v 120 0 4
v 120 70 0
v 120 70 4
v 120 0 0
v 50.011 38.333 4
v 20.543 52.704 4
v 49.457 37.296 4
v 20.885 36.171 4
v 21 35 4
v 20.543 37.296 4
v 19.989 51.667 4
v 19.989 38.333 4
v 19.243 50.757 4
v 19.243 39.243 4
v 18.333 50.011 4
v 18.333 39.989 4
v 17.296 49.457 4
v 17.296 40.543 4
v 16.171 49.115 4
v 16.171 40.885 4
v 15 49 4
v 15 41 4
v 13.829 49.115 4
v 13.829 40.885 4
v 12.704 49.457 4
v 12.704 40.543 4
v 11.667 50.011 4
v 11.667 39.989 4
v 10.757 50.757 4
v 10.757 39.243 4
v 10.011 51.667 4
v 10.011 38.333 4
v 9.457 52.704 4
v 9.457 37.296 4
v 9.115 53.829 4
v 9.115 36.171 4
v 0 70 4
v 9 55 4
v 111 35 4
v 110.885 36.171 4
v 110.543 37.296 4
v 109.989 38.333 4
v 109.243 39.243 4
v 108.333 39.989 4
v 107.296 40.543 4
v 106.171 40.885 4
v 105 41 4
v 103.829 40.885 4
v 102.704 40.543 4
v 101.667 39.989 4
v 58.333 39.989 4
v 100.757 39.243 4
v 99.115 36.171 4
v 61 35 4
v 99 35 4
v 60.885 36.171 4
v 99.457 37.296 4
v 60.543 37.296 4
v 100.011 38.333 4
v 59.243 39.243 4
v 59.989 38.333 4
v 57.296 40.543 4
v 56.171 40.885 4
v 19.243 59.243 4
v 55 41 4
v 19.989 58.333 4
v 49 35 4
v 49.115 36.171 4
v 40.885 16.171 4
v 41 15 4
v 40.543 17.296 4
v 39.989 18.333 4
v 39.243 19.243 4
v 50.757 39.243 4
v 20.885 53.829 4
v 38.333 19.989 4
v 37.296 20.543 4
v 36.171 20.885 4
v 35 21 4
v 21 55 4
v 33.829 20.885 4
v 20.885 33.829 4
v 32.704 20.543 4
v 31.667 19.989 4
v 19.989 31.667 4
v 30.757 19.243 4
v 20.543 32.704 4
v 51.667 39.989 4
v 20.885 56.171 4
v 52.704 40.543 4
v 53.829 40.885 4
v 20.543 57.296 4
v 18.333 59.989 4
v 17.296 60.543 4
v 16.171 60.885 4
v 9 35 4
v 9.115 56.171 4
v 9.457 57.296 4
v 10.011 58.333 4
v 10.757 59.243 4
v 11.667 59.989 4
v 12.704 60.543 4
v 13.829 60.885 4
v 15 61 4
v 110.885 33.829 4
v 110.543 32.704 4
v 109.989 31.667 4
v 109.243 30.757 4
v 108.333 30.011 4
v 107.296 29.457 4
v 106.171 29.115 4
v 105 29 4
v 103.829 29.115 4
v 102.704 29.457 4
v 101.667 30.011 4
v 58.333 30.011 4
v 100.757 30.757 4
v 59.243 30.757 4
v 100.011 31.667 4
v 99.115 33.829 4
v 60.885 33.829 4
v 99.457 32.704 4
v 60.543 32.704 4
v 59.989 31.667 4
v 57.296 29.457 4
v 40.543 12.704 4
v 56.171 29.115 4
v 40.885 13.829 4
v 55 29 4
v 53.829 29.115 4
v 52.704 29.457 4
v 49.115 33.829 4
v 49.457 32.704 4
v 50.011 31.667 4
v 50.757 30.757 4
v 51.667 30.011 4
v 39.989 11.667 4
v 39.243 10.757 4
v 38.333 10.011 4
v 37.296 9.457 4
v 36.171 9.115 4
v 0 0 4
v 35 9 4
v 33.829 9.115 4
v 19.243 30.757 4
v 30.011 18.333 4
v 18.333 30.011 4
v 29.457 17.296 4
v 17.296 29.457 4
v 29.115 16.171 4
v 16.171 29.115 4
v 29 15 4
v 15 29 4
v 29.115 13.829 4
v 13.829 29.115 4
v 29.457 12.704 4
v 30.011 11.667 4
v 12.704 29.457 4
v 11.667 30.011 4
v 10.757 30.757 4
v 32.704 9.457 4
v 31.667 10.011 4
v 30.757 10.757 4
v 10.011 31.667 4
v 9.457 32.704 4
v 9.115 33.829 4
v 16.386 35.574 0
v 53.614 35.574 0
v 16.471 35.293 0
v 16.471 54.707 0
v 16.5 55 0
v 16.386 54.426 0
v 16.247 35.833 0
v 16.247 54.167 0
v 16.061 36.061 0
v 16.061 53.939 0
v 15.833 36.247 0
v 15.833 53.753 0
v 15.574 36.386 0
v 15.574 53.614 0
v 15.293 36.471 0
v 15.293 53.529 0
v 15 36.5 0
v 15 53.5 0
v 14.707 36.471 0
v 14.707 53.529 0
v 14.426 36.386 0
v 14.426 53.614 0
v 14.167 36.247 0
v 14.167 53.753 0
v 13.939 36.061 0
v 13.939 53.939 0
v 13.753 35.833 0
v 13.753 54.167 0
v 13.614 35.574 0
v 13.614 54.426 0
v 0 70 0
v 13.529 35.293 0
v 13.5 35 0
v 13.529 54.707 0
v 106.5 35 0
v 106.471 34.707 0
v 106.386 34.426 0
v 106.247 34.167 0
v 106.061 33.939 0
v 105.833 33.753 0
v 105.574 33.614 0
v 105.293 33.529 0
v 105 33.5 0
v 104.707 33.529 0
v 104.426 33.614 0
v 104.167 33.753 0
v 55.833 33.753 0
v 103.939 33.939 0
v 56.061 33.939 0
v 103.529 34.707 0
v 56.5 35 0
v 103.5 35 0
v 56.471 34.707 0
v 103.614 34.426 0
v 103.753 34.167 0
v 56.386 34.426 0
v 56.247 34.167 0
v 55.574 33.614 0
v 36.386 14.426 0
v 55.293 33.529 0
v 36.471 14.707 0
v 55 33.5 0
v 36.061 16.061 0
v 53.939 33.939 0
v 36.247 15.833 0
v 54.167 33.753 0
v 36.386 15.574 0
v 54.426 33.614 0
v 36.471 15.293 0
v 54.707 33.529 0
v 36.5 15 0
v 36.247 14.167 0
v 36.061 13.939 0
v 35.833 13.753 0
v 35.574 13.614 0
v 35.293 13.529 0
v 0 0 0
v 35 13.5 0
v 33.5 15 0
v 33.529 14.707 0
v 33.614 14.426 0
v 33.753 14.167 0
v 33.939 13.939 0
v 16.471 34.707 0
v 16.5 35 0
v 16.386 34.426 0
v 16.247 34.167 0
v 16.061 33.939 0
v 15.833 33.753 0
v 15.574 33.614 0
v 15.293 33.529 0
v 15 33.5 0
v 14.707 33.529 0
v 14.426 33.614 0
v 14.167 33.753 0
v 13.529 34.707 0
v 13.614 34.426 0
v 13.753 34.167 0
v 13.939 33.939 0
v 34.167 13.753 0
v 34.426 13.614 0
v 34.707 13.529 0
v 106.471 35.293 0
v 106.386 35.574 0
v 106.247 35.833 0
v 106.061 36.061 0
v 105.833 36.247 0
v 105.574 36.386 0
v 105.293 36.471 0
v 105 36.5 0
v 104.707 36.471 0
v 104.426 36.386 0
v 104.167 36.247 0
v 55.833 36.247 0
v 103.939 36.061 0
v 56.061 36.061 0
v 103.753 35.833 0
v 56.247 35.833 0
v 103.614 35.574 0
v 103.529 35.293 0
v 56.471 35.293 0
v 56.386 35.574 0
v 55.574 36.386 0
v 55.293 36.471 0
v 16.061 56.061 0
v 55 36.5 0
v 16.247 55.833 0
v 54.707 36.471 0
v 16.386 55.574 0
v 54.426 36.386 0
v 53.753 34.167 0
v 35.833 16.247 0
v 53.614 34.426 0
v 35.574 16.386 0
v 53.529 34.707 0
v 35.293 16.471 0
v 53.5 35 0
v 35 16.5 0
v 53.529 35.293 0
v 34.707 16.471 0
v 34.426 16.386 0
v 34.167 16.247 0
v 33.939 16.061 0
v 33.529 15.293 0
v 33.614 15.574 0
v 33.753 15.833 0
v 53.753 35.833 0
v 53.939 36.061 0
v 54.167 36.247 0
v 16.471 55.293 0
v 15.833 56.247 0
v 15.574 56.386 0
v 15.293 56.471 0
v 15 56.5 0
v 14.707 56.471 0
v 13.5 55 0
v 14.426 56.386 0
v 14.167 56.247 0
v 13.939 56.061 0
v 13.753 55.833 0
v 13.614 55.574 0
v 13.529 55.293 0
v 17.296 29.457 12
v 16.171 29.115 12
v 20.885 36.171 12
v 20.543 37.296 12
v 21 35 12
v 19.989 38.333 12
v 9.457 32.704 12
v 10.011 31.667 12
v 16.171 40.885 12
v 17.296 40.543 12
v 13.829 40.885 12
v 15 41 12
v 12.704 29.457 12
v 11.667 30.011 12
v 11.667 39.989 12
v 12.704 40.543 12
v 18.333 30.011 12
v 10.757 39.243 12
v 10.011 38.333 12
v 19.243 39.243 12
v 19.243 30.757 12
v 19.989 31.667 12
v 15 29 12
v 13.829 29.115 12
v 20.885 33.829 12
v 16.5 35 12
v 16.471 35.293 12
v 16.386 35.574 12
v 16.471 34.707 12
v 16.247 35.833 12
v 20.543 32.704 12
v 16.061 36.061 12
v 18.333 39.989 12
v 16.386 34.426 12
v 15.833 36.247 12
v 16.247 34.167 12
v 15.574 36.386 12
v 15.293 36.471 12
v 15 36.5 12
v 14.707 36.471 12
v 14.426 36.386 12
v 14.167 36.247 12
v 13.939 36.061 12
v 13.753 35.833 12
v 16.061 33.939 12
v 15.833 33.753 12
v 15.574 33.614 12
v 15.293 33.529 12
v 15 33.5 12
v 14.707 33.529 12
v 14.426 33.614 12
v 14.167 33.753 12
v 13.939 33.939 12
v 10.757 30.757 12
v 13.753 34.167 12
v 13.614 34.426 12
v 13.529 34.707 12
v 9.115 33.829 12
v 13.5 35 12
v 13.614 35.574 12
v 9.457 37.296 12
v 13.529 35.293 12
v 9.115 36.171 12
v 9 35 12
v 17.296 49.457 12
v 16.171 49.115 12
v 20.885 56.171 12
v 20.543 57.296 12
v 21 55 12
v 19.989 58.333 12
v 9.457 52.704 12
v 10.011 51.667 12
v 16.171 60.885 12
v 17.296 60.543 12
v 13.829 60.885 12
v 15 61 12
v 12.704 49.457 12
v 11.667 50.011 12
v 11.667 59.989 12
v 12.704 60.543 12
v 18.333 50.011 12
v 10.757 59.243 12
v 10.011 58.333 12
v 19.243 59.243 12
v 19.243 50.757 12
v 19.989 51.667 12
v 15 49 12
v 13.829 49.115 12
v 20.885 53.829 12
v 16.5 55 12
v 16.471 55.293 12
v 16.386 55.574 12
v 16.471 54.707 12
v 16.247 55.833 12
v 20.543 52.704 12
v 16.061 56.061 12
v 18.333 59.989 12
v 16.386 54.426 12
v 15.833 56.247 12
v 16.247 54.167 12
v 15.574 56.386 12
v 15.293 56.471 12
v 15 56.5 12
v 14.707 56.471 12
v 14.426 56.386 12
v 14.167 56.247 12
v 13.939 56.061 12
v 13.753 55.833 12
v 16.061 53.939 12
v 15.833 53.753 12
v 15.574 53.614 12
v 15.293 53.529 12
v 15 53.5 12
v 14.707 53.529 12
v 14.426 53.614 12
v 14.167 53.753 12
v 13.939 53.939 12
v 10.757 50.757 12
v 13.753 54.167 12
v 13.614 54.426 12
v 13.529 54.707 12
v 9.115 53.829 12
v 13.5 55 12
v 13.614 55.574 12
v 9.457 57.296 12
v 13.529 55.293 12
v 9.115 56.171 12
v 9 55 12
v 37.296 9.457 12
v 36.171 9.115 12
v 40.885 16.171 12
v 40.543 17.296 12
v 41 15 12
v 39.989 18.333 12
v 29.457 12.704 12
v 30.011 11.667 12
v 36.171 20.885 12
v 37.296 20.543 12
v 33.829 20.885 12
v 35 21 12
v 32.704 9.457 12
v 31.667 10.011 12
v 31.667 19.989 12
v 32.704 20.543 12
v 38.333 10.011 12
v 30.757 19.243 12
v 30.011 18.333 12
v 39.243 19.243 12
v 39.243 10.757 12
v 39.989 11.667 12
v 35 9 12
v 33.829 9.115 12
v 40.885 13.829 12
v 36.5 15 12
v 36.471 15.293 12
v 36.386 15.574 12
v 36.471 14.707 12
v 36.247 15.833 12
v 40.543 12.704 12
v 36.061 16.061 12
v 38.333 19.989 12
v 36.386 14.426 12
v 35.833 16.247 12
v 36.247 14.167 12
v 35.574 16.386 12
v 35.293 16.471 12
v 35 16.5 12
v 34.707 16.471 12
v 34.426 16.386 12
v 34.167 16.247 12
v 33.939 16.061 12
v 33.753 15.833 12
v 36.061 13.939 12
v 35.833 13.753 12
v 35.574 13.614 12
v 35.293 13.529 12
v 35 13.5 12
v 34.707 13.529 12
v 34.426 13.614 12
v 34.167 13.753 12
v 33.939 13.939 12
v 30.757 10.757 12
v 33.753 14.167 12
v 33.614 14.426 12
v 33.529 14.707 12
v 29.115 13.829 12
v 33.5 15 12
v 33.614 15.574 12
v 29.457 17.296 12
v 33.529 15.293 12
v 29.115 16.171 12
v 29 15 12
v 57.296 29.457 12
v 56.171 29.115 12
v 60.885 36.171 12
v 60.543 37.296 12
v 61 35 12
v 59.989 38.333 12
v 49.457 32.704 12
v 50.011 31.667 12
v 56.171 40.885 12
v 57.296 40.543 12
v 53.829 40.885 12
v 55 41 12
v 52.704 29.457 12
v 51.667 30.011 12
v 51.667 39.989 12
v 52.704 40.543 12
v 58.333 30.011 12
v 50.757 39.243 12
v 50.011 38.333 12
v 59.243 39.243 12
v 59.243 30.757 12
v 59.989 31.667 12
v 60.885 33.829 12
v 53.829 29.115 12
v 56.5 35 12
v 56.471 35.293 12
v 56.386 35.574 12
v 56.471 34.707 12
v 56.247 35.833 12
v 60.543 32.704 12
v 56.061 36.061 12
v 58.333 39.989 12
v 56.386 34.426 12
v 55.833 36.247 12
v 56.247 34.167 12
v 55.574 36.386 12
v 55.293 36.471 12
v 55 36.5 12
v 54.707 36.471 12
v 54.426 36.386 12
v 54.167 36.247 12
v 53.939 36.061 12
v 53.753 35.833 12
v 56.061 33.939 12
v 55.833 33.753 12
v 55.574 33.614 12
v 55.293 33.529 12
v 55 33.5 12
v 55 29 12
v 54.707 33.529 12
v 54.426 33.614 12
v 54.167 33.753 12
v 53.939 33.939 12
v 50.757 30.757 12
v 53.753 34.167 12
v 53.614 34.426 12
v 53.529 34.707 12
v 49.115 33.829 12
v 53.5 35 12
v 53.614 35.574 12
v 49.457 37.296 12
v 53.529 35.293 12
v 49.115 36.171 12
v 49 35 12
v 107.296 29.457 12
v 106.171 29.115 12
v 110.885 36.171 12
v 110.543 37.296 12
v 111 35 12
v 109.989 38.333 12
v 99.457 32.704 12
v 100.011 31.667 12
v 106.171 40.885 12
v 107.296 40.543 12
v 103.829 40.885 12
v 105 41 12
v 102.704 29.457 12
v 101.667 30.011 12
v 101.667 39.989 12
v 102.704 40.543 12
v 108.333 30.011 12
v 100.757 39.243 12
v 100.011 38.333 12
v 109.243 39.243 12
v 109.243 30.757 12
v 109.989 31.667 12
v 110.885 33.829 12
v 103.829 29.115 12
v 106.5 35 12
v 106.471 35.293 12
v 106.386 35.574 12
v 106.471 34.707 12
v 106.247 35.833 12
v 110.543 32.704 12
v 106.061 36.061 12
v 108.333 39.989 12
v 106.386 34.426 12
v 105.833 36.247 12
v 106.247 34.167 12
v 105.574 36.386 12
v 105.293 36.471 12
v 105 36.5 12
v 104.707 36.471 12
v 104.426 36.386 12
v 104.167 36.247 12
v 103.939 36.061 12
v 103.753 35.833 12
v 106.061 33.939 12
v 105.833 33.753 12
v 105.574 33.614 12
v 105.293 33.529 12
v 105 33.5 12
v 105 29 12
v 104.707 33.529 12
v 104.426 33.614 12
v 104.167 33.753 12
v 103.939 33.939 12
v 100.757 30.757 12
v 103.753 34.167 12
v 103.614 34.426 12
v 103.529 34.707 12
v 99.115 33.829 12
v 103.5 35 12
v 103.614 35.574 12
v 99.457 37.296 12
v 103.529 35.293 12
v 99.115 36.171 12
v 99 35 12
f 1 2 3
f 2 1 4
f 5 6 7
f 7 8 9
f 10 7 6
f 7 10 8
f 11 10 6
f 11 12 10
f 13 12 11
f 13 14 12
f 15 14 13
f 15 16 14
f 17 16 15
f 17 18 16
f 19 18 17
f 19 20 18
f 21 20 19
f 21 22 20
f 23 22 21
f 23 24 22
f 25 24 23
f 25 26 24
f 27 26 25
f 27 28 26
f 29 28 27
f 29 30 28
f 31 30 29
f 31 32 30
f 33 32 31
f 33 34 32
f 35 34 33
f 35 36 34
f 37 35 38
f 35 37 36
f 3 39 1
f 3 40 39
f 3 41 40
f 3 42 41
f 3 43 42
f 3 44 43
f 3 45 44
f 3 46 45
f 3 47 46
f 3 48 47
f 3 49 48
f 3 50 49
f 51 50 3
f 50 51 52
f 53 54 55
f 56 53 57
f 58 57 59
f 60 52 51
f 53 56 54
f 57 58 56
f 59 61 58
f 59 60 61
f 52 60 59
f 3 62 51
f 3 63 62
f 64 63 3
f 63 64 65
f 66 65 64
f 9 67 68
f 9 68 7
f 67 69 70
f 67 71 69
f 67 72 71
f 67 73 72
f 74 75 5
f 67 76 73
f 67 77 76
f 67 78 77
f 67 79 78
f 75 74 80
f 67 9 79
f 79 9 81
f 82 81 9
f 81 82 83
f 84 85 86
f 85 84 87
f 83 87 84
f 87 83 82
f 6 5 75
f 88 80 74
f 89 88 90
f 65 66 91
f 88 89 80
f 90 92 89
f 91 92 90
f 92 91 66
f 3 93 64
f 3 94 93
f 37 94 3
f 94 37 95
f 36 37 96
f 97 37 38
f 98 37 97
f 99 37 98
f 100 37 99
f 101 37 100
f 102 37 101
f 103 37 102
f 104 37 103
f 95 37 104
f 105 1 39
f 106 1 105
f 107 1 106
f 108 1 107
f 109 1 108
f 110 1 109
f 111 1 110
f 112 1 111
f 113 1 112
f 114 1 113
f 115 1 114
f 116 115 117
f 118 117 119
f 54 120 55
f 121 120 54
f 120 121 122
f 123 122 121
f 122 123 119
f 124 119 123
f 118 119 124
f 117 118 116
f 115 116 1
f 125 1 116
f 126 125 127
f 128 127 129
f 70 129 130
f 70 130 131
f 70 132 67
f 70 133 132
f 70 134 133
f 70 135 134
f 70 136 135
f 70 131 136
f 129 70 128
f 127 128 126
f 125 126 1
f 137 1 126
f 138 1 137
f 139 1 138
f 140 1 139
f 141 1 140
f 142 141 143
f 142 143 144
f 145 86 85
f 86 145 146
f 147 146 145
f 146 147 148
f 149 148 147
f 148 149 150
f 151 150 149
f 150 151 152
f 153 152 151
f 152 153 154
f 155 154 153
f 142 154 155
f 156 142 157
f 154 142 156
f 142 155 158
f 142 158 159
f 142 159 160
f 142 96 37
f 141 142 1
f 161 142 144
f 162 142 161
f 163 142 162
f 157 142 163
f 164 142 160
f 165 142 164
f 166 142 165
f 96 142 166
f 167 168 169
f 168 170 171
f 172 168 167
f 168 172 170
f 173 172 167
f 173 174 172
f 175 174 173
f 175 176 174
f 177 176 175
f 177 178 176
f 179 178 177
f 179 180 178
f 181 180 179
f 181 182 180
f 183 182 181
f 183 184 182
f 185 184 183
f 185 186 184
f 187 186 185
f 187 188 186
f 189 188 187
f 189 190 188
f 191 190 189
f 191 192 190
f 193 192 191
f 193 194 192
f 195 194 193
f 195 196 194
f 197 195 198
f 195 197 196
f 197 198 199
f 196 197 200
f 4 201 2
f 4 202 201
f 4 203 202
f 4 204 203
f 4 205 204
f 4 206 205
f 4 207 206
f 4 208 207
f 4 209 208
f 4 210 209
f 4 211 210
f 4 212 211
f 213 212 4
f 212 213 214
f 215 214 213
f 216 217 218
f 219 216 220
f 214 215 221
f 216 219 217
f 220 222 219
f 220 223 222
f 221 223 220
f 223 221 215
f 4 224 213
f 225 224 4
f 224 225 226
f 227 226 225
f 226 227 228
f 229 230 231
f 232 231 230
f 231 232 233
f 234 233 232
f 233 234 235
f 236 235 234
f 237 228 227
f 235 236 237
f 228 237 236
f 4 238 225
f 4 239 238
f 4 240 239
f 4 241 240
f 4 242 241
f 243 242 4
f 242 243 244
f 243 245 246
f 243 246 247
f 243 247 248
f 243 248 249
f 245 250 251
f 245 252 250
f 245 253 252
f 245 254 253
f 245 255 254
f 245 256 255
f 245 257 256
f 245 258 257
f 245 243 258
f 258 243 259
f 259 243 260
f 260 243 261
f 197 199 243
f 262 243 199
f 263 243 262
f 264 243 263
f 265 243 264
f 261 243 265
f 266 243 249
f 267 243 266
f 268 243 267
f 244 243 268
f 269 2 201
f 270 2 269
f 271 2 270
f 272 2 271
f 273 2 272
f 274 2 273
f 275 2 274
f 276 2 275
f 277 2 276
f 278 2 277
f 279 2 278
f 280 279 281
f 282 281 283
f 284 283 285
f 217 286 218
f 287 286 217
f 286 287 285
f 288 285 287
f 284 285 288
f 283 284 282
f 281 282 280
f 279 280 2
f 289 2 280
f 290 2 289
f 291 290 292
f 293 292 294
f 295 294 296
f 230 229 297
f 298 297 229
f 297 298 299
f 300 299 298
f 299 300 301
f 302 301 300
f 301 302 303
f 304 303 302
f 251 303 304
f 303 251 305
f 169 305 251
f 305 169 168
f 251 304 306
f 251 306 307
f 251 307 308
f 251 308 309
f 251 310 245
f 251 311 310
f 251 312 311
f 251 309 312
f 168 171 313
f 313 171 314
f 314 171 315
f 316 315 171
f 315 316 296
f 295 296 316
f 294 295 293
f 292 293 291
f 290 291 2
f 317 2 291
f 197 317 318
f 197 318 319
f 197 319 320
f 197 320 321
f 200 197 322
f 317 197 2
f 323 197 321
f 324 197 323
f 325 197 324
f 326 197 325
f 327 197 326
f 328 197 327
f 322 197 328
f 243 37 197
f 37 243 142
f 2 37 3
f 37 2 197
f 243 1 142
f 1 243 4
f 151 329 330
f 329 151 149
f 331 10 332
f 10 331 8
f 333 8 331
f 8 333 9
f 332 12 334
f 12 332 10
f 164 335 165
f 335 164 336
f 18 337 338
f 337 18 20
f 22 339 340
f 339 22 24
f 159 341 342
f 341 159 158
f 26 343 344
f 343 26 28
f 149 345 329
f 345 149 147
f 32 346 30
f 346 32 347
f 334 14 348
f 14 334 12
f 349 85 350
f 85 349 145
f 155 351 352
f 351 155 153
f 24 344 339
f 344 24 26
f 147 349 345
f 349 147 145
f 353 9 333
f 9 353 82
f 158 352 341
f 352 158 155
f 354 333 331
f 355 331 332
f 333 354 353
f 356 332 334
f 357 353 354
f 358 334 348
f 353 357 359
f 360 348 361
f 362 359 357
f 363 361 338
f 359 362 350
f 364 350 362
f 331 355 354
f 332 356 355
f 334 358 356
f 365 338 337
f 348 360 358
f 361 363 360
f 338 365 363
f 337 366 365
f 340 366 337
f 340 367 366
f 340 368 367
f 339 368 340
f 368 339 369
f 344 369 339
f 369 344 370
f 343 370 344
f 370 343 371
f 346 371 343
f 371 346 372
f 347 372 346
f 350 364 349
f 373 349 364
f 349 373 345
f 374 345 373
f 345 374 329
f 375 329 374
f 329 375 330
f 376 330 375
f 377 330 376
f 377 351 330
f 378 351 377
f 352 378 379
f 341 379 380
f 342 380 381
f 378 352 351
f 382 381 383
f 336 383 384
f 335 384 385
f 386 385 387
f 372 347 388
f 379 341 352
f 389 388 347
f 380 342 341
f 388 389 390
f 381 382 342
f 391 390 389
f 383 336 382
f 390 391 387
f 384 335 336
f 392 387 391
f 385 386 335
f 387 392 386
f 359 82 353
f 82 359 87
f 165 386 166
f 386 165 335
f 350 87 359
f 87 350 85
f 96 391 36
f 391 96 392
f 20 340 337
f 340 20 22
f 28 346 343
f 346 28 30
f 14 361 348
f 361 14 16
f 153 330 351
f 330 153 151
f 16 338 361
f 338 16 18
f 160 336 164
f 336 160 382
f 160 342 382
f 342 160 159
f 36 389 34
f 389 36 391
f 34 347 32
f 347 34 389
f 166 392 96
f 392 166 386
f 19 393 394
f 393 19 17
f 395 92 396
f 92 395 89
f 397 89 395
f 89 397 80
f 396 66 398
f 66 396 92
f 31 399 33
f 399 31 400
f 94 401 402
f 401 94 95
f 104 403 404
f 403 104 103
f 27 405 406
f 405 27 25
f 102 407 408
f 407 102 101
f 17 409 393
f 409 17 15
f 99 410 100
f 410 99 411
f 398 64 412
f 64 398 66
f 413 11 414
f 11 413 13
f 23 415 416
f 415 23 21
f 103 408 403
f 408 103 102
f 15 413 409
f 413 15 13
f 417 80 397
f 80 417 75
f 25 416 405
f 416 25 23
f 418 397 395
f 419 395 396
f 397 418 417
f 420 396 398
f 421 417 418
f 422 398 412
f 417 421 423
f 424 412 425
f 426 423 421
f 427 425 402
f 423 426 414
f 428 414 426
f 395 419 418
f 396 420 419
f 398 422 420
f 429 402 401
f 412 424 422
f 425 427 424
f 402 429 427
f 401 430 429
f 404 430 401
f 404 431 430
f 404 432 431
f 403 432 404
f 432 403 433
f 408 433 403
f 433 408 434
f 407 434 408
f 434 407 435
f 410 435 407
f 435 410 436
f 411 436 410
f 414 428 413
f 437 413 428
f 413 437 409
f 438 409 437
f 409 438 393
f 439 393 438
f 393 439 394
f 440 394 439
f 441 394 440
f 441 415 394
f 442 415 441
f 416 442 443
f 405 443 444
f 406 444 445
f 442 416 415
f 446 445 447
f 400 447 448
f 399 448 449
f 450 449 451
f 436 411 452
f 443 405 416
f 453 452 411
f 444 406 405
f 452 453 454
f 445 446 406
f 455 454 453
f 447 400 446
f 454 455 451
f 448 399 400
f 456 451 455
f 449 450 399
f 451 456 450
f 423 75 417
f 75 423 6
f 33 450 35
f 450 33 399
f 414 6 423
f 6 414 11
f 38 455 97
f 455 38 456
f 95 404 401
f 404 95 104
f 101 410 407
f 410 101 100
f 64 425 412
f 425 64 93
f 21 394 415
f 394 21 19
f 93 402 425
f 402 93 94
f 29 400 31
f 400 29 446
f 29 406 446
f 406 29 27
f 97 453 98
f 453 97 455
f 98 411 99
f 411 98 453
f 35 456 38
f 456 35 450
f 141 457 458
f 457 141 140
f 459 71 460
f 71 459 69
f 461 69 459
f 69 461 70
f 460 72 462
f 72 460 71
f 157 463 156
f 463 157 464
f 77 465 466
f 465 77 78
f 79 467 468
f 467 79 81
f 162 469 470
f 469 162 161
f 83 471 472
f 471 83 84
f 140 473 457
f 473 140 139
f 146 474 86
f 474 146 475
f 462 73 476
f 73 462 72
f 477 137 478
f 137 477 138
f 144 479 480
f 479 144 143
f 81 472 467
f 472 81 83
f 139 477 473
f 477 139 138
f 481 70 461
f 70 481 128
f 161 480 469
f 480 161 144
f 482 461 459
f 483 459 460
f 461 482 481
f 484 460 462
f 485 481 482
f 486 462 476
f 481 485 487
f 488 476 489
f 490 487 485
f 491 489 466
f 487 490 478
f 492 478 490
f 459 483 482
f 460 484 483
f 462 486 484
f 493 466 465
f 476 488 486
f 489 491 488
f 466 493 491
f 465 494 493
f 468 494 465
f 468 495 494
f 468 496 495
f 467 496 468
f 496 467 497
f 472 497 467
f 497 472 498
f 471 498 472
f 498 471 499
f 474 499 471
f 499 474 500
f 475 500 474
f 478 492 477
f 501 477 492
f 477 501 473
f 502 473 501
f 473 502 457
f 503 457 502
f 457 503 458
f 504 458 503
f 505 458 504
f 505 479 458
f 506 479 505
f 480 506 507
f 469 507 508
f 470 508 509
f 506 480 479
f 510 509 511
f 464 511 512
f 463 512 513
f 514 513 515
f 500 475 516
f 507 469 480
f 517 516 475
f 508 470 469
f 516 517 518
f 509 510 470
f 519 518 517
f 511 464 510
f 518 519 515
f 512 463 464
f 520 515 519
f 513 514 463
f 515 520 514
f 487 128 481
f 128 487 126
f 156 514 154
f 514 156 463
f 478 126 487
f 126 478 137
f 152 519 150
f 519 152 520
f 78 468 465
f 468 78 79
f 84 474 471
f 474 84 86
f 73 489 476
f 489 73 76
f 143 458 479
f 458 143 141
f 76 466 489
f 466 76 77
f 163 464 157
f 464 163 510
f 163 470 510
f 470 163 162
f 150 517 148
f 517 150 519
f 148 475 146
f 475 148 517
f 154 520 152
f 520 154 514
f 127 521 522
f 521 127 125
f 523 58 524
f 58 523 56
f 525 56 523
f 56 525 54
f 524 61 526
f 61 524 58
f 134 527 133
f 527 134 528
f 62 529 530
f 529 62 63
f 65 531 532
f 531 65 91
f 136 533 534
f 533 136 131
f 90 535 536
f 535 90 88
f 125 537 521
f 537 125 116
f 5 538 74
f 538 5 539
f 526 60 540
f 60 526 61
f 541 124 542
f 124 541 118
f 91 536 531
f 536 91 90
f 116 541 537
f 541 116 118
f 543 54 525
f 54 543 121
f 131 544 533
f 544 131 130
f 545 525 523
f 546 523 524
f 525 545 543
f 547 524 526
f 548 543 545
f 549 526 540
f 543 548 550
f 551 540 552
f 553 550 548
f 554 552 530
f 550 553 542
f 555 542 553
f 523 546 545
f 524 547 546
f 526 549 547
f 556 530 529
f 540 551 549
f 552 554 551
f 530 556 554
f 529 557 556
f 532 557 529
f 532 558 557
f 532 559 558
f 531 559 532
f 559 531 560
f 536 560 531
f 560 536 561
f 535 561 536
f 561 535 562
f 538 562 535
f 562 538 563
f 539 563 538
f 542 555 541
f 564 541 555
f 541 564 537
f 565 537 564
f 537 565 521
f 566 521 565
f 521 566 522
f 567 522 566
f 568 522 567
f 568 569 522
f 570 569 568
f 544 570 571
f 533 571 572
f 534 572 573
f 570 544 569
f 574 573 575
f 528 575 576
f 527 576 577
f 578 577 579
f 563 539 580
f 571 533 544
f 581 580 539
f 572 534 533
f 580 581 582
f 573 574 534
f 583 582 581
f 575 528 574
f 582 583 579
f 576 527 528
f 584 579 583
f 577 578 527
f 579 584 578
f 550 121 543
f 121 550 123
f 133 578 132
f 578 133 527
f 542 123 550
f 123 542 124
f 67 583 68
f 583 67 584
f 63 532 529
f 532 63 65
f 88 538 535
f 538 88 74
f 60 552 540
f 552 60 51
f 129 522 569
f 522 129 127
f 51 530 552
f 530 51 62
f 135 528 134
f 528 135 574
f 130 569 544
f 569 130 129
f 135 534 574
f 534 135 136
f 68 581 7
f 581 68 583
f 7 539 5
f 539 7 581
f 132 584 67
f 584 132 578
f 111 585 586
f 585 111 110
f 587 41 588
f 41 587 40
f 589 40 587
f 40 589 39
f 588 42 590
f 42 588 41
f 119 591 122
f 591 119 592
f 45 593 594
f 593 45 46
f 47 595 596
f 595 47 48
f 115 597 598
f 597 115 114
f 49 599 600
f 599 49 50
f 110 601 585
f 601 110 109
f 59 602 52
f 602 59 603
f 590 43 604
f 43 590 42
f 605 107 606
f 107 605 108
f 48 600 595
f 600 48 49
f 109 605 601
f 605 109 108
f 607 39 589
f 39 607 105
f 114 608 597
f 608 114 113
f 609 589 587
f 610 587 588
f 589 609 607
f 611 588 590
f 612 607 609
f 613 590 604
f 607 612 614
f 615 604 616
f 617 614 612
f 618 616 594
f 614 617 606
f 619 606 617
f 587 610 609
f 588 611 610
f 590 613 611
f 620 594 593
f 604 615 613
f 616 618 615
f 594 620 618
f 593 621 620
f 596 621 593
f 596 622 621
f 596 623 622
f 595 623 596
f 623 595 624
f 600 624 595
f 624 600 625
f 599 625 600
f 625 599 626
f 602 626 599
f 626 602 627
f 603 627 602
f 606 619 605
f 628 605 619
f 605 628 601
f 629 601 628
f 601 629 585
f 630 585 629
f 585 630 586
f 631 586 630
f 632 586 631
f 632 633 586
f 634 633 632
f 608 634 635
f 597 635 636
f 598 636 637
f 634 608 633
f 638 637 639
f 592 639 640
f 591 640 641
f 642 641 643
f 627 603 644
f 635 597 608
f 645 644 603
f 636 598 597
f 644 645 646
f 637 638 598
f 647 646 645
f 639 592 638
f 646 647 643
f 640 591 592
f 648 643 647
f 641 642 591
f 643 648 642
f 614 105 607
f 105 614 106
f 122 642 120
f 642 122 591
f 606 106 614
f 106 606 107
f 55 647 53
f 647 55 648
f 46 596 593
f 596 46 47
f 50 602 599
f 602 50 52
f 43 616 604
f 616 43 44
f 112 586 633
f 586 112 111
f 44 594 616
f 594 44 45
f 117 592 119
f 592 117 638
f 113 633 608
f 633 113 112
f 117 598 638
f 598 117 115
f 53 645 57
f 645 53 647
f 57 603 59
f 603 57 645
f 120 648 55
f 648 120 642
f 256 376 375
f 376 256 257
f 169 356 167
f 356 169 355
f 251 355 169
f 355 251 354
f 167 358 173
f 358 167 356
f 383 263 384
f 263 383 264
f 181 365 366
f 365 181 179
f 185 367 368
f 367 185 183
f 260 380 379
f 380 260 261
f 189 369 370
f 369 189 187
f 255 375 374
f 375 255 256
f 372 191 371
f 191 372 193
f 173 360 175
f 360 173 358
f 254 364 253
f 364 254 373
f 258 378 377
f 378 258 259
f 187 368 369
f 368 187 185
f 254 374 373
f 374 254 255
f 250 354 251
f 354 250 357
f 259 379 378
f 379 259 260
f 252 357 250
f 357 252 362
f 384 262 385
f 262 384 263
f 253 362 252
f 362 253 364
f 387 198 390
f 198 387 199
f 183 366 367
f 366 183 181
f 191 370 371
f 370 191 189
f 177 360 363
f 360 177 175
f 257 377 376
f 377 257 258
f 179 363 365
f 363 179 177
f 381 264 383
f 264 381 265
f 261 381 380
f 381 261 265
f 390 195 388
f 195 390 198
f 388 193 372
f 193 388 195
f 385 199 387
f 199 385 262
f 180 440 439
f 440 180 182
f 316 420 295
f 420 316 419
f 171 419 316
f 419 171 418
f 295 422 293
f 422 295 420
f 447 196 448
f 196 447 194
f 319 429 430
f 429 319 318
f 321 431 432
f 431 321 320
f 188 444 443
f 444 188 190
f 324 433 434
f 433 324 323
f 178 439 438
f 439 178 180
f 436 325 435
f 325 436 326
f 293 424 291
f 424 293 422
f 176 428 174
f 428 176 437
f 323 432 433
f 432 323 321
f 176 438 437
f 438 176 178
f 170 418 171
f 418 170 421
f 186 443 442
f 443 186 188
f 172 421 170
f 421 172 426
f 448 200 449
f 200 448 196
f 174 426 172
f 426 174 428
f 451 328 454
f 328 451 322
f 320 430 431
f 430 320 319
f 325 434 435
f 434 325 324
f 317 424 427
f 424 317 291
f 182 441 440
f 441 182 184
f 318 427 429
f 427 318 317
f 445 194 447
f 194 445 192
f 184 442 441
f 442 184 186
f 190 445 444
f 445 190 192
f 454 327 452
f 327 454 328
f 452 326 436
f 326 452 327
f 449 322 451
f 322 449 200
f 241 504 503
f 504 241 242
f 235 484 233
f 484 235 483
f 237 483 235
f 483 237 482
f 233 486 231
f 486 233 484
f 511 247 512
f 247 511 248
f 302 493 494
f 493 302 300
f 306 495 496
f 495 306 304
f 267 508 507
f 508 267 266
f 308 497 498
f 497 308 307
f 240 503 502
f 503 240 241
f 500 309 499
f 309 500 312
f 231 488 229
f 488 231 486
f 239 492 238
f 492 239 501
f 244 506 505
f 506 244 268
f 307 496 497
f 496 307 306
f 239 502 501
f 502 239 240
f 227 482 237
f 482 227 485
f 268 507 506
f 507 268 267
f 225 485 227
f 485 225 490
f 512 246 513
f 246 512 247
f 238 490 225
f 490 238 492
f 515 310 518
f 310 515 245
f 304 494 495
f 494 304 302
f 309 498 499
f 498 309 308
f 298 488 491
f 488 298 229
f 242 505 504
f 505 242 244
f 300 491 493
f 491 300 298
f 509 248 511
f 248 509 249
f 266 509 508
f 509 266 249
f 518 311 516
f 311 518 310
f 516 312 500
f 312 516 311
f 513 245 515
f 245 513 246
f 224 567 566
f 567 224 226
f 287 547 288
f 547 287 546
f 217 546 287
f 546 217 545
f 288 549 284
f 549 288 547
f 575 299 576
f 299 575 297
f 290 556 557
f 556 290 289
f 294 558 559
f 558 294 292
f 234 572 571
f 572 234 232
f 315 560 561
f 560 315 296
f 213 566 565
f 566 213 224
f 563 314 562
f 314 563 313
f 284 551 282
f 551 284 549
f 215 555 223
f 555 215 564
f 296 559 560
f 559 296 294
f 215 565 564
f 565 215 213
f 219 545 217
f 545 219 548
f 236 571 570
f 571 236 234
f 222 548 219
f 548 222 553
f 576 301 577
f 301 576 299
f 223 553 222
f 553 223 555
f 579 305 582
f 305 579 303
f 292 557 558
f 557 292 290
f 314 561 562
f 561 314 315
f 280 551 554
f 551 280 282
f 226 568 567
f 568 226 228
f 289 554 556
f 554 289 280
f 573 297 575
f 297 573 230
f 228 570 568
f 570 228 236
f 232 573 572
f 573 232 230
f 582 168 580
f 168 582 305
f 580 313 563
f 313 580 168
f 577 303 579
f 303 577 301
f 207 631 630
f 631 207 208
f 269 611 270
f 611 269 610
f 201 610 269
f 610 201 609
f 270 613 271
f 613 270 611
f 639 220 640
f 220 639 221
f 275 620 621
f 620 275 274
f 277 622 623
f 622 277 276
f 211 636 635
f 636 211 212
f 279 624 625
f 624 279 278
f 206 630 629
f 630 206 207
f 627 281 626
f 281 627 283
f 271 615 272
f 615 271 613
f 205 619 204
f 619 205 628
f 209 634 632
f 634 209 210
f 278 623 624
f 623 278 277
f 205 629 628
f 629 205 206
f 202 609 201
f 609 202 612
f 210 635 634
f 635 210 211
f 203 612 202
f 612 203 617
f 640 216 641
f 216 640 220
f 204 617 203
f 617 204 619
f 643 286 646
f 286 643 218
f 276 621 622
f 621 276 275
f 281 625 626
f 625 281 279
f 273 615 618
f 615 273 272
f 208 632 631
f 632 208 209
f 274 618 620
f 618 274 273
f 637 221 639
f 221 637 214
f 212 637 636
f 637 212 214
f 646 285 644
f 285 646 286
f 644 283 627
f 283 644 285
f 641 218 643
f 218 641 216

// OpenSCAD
$fn = 32;

// ----------------------------------------------------------------------
// Boss field: plate with bosses at given coordinates
// ----------------------------------------------------------------------

// --- parameters (mm) ---
plate_l = 120;            // plate length, X
plate_w = 70;             // plate width, Y
plate_t = 4;              // plate thickness, Z
boss_d = 12;              // boss diameter
boss_h = 8;               // boss height above the plate
bore_d = 3;               // boss bore
fit_tol = 0.05;           // tolerance for press fits, mm
free_tol = 0.2;           // tolerance for clearance fits, mm

total_h = plate_t + boss_h;  // overall height

difference() {
  union() {
    cube([plate_l, plate_w, plate_t]);
    translate([15, 35, plate_t]) cylinder(h = boss_h, d = boss_d);
    translate([15, 55, plate_t]) cylinder(h = boss_h, d = boss_d);
    translate([35, 15, plate_t]) cylinder(h = boss_h, d = boss_d);
    translate([55, 35, plate_t]) cylinder(h = boss_h, d = boss_d);
    translate([105, 35, plate_t]) cylinder(h = boss_h, d = boss_d);
  }
  translate([15, 35, -1]) cylinder(h = total_h + 2, d = bore_d);
  translate([15, 55, -1]) cylinder(h = total_h + 2, d = bore_d);
  translate([35, 15, -1]) cylinder(h = total_h + 2, d = bore_d);
  translate([55, 35, -1]) cylinder(h = total_h + 2, d = bore_d);
  translate([105, 35, -1]) cylinder(h = total_h + 2, d = bore_d);
}
